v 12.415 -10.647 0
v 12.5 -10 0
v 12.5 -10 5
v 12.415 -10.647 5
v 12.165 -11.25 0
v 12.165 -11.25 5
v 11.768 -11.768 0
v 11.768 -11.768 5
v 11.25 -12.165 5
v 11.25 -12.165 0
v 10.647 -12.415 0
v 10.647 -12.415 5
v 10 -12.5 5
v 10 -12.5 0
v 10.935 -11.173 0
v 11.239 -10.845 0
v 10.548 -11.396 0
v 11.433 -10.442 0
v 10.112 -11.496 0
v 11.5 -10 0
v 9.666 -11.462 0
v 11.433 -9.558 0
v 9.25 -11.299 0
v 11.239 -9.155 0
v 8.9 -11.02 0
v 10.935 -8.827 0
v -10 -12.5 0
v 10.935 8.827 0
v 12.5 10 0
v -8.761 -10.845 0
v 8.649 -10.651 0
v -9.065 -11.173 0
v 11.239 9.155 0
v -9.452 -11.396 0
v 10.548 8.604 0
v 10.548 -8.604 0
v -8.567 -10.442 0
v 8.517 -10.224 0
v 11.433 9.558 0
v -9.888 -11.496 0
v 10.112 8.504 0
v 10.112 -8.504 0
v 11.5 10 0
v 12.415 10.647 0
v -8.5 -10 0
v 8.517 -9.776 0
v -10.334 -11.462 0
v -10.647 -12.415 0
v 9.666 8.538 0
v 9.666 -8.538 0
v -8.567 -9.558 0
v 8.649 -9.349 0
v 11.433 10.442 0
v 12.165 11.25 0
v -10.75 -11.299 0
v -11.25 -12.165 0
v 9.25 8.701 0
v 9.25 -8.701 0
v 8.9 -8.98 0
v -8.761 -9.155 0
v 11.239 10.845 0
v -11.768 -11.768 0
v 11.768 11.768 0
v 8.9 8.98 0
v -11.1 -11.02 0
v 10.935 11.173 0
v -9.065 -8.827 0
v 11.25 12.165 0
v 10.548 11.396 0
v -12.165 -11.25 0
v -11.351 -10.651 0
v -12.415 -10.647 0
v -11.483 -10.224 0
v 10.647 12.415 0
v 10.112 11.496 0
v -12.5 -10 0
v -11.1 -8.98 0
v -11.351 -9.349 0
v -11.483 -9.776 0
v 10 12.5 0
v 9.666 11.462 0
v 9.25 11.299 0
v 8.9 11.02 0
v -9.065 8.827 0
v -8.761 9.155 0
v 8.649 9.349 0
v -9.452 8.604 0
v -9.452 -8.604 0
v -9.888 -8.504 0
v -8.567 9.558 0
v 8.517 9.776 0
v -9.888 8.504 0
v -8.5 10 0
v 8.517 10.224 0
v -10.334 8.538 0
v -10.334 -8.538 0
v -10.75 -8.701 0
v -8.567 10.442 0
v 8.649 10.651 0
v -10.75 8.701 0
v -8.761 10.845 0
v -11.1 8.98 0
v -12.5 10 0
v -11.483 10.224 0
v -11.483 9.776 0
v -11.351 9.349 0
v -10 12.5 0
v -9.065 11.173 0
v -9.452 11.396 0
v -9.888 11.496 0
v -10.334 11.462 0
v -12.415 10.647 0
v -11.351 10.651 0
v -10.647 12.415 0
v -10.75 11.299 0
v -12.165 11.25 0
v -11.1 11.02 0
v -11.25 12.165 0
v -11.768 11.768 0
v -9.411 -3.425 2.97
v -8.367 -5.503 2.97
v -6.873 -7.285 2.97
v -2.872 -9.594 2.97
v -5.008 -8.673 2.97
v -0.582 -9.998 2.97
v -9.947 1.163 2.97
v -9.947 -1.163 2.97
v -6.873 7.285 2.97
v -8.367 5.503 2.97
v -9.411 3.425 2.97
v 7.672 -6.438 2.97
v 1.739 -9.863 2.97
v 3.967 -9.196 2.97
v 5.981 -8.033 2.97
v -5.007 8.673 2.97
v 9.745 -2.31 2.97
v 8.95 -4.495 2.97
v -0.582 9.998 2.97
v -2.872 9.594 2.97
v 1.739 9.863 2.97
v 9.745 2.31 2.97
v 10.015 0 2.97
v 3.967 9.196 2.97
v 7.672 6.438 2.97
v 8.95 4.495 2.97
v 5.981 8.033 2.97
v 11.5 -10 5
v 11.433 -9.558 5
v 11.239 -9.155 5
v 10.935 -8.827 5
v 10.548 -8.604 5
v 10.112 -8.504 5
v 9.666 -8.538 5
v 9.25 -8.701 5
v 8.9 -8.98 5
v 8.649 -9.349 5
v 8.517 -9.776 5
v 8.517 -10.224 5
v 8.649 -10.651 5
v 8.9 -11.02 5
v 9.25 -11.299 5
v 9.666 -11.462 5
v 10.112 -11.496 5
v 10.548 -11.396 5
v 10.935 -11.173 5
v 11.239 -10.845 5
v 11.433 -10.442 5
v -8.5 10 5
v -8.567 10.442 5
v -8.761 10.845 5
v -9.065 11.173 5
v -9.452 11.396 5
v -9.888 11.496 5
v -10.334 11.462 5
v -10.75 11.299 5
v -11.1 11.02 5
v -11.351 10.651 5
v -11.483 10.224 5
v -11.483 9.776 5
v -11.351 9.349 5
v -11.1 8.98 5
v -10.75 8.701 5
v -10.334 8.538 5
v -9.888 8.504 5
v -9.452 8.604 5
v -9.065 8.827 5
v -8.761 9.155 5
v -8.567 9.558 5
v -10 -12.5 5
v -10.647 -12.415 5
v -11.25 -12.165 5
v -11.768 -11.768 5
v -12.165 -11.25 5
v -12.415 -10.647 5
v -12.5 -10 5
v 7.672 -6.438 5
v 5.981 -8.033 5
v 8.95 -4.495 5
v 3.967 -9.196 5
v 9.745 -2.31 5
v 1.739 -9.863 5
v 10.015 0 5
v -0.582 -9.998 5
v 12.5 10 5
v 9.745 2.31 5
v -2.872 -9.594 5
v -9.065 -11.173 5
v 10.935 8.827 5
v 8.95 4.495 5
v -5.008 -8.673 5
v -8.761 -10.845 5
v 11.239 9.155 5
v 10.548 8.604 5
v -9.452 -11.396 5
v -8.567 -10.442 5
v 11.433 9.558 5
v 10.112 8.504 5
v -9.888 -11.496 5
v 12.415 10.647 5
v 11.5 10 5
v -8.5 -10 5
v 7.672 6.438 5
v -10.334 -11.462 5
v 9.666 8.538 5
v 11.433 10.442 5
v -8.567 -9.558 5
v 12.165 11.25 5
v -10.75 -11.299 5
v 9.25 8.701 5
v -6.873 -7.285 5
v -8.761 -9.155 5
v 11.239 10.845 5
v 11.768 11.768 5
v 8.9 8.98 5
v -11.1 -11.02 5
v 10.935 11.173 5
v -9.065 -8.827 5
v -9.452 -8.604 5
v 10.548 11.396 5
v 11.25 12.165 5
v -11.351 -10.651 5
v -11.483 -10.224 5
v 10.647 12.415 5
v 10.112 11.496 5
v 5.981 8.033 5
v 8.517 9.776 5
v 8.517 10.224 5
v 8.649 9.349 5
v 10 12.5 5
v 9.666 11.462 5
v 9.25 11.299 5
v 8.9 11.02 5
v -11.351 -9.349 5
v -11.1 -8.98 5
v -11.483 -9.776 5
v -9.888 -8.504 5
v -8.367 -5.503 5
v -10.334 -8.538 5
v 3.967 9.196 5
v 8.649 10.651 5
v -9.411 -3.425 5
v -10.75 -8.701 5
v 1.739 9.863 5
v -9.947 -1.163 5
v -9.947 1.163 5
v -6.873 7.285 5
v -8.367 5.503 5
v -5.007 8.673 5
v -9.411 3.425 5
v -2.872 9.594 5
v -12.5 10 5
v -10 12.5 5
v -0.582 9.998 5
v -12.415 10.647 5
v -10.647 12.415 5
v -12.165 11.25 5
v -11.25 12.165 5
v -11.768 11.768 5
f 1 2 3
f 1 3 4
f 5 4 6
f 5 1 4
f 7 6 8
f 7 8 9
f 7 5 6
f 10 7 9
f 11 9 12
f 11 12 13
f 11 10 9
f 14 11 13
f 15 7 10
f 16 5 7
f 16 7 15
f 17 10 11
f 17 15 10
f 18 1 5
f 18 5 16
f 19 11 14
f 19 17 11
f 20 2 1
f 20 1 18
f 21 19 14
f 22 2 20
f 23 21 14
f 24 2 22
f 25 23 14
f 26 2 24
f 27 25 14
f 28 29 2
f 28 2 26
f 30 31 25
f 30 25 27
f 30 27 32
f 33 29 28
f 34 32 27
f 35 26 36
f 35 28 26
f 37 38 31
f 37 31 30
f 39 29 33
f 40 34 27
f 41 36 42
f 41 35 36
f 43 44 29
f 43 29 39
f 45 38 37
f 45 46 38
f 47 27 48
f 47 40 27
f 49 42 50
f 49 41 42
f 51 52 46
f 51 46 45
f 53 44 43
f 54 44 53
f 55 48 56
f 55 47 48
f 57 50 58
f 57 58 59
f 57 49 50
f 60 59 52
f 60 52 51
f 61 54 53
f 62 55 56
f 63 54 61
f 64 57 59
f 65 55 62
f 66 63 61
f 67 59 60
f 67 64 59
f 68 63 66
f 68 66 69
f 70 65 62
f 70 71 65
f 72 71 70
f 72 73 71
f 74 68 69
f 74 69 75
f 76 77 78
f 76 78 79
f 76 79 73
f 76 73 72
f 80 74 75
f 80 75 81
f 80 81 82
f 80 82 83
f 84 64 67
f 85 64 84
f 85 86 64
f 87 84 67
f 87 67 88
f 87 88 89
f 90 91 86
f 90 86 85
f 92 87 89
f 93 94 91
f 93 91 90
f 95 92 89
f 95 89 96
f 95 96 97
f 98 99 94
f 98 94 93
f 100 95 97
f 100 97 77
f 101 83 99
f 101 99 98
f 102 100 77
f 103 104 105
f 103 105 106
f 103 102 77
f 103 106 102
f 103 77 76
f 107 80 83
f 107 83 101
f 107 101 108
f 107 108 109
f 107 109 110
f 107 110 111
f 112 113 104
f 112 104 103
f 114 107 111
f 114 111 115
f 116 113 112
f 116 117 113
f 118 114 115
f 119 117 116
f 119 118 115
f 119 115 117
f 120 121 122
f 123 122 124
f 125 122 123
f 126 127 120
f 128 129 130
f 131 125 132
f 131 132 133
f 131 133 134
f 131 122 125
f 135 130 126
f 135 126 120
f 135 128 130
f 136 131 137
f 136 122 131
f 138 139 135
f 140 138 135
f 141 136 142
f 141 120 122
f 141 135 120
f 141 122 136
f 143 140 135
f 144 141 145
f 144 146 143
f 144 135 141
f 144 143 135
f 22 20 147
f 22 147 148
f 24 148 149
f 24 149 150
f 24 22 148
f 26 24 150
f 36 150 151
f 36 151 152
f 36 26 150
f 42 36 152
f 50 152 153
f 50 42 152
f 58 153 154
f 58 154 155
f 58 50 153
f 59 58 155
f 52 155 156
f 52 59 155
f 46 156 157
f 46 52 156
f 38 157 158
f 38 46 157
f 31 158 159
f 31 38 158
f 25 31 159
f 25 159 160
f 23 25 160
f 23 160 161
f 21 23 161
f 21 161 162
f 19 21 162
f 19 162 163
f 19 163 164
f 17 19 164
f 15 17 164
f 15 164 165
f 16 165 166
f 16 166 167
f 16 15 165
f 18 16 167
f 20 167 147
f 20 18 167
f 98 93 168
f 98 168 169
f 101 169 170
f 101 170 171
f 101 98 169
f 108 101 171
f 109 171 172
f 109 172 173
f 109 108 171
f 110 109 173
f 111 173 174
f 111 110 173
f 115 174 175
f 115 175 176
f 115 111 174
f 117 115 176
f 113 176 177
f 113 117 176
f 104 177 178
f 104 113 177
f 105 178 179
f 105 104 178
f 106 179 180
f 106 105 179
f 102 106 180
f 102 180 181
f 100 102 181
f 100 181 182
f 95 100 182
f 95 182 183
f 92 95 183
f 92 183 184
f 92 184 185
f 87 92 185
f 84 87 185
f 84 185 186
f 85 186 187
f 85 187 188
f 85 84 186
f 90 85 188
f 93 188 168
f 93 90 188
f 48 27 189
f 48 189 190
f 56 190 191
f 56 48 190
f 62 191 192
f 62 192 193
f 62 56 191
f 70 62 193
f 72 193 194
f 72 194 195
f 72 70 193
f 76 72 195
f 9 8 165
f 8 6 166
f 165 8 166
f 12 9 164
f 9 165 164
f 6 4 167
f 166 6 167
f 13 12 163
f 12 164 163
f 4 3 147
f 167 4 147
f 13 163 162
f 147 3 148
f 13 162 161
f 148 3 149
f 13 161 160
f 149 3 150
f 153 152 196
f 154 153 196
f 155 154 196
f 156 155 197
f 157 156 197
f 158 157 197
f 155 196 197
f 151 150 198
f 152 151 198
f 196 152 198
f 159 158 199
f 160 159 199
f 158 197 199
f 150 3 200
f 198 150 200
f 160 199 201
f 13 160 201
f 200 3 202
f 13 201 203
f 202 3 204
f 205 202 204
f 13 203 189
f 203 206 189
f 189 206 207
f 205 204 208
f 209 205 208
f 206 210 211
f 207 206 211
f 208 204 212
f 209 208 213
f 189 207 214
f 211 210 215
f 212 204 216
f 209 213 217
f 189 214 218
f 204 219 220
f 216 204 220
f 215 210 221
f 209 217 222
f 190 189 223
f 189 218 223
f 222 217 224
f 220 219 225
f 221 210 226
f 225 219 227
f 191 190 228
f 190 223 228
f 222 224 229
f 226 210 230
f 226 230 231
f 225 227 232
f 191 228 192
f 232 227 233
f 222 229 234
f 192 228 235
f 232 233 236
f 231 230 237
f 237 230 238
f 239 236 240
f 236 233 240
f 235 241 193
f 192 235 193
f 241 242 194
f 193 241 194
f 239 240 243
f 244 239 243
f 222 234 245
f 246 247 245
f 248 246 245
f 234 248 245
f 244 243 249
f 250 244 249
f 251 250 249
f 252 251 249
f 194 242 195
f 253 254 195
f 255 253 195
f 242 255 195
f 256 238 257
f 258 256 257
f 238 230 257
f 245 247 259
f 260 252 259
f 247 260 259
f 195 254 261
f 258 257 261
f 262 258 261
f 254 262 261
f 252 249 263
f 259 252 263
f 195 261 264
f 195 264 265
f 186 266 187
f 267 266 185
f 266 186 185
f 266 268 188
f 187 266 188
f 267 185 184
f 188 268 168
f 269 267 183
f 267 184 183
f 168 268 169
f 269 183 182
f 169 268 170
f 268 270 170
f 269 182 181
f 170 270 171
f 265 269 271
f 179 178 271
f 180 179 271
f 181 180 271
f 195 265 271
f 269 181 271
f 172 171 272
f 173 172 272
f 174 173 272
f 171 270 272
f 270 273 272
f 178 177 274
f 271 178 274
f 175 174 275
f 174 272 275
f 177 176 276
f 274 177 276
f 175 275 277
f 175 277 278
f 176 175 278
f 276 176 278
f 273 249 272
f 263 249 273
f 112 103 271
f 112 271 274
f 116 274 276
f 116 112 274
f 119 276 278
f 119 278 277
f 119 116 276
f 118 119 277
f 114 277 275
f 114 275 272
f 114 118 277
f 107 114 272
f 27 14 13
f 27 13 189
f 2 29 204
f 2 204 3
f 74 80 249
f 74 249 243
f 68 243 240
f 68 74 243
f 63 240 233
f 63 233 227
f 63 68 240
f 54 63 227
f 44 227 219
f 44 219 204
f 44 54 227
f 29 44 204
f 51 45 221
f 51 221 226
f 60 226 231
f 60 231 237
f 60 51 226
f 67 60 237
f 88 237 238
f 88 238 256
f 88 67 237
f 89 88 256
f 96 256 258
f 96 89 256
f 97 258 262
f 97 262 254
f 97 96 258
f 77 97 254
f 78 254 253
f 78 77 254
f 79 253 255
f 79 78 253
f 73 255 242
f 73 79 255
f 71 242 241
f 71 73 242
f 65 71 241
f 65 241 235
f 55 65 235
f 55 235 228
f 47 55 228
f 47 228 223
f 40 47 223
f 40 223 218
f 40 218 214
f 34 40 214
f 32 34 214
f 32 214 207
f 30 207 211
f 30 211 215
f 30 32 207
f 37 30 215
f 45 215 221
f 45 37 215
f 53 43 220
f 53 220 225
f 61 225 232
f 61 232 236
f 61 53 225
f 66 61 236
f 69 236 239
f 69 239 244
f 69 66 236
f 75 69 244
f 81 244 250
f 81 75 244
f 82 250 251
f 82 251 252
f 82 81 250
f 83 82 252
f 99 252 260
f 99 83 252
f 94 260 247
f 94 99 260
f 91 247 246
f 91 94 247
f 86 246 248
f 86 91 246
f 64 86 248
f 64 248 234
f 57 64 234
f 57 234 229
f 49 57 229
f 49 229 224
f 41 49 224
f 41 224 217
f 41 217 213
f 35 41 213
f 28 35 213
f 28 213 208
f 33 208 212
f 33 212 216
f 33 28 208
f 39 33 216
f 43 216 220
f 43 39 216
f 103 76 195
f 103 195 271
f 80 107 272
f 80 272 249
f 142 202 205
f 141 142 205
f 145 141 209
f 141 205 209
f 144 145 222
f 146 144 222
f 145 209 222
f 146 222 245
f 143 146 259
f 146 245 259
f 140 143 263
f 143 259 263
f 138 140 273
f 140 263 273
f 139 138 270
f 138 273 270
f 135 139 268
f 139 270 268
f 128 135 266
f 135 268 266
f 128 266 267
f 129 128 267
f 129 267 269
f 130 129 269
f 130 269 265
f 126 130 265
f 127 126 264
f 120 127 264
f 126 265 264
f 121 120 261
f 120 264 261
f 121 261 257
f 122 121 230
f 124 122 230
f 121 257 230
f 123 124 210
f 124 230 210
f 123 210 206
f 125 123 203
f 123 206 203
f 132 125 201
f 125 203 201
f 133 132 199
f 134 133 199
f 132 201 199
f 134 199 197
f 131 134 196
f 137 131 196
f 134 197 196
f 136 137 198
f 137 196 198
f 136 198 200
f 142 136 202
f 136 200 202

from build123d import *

# Parameters (mm, degrees)
ESQUISSE1_R             = 1.5
BOSS_EXTRU_1_DEPTH      = 5
ESQUISSE2_R             = 10.015
ENL_V_MAT_EXTRU_1_DEPTH = 2.03


with BuildPart() as part:
    # Esquisse1 → Boss.-Extru.1 (new body)
    with BuildSketch(Plane.XY):
        with BuildLine():
            Line((-10, 12.5), (10, 12.5))
            ThreePointArc((10, 12.5), (11.767766953, 11.767766953), (12.5, 10))
            Line((12.5, 10), (12.5, -10))
            ThreePointArc((12.5, -10), (11.767766953, -11.767766953), (10, -12.5))
            Line((10, -12.5), (-10, -12.5))
            ThreePointArc((-10, -12.5), (-11.767766953, -11.767766953), (-12.5, -10))
            Line((-12.5, -10), (-12.5, 10))
            ThreePointArc((-12.5, 10), (-11.767766953, 11.767766953), (-10, 12.5))
        make_face()
        with Locations((-10, 10)):
            Circle(ESQUISSE1_R, mode=Mode.SUBTRACT)
        with Locations((10, 10)):
            Circle(ESQUISSE1_R, mode=Mode.SUBTRACT)
        with Locations((10, -10)):
            Circle(ESQUISSE1_R, mode=Mode.SUBTRACT)
        with Locations((-10, -10)):
            Circle(ESQUISSE1_R, mode=Mode.SUBTRACT)
    extrude(amount=BOSS_EXTRU_1_DEPTH)

    # Esquisse2 → Enlèv. mat.-Extru.1 (cut)
    with BuildSketch(Plane.XY.offset(5)):
        Circle(ESQUISSE2_R)
    extrude(amount=-ENL_V_MAT_EXTRU_1_DEPTH, mode=Mode.SUBTRACT)


solid = part.part
